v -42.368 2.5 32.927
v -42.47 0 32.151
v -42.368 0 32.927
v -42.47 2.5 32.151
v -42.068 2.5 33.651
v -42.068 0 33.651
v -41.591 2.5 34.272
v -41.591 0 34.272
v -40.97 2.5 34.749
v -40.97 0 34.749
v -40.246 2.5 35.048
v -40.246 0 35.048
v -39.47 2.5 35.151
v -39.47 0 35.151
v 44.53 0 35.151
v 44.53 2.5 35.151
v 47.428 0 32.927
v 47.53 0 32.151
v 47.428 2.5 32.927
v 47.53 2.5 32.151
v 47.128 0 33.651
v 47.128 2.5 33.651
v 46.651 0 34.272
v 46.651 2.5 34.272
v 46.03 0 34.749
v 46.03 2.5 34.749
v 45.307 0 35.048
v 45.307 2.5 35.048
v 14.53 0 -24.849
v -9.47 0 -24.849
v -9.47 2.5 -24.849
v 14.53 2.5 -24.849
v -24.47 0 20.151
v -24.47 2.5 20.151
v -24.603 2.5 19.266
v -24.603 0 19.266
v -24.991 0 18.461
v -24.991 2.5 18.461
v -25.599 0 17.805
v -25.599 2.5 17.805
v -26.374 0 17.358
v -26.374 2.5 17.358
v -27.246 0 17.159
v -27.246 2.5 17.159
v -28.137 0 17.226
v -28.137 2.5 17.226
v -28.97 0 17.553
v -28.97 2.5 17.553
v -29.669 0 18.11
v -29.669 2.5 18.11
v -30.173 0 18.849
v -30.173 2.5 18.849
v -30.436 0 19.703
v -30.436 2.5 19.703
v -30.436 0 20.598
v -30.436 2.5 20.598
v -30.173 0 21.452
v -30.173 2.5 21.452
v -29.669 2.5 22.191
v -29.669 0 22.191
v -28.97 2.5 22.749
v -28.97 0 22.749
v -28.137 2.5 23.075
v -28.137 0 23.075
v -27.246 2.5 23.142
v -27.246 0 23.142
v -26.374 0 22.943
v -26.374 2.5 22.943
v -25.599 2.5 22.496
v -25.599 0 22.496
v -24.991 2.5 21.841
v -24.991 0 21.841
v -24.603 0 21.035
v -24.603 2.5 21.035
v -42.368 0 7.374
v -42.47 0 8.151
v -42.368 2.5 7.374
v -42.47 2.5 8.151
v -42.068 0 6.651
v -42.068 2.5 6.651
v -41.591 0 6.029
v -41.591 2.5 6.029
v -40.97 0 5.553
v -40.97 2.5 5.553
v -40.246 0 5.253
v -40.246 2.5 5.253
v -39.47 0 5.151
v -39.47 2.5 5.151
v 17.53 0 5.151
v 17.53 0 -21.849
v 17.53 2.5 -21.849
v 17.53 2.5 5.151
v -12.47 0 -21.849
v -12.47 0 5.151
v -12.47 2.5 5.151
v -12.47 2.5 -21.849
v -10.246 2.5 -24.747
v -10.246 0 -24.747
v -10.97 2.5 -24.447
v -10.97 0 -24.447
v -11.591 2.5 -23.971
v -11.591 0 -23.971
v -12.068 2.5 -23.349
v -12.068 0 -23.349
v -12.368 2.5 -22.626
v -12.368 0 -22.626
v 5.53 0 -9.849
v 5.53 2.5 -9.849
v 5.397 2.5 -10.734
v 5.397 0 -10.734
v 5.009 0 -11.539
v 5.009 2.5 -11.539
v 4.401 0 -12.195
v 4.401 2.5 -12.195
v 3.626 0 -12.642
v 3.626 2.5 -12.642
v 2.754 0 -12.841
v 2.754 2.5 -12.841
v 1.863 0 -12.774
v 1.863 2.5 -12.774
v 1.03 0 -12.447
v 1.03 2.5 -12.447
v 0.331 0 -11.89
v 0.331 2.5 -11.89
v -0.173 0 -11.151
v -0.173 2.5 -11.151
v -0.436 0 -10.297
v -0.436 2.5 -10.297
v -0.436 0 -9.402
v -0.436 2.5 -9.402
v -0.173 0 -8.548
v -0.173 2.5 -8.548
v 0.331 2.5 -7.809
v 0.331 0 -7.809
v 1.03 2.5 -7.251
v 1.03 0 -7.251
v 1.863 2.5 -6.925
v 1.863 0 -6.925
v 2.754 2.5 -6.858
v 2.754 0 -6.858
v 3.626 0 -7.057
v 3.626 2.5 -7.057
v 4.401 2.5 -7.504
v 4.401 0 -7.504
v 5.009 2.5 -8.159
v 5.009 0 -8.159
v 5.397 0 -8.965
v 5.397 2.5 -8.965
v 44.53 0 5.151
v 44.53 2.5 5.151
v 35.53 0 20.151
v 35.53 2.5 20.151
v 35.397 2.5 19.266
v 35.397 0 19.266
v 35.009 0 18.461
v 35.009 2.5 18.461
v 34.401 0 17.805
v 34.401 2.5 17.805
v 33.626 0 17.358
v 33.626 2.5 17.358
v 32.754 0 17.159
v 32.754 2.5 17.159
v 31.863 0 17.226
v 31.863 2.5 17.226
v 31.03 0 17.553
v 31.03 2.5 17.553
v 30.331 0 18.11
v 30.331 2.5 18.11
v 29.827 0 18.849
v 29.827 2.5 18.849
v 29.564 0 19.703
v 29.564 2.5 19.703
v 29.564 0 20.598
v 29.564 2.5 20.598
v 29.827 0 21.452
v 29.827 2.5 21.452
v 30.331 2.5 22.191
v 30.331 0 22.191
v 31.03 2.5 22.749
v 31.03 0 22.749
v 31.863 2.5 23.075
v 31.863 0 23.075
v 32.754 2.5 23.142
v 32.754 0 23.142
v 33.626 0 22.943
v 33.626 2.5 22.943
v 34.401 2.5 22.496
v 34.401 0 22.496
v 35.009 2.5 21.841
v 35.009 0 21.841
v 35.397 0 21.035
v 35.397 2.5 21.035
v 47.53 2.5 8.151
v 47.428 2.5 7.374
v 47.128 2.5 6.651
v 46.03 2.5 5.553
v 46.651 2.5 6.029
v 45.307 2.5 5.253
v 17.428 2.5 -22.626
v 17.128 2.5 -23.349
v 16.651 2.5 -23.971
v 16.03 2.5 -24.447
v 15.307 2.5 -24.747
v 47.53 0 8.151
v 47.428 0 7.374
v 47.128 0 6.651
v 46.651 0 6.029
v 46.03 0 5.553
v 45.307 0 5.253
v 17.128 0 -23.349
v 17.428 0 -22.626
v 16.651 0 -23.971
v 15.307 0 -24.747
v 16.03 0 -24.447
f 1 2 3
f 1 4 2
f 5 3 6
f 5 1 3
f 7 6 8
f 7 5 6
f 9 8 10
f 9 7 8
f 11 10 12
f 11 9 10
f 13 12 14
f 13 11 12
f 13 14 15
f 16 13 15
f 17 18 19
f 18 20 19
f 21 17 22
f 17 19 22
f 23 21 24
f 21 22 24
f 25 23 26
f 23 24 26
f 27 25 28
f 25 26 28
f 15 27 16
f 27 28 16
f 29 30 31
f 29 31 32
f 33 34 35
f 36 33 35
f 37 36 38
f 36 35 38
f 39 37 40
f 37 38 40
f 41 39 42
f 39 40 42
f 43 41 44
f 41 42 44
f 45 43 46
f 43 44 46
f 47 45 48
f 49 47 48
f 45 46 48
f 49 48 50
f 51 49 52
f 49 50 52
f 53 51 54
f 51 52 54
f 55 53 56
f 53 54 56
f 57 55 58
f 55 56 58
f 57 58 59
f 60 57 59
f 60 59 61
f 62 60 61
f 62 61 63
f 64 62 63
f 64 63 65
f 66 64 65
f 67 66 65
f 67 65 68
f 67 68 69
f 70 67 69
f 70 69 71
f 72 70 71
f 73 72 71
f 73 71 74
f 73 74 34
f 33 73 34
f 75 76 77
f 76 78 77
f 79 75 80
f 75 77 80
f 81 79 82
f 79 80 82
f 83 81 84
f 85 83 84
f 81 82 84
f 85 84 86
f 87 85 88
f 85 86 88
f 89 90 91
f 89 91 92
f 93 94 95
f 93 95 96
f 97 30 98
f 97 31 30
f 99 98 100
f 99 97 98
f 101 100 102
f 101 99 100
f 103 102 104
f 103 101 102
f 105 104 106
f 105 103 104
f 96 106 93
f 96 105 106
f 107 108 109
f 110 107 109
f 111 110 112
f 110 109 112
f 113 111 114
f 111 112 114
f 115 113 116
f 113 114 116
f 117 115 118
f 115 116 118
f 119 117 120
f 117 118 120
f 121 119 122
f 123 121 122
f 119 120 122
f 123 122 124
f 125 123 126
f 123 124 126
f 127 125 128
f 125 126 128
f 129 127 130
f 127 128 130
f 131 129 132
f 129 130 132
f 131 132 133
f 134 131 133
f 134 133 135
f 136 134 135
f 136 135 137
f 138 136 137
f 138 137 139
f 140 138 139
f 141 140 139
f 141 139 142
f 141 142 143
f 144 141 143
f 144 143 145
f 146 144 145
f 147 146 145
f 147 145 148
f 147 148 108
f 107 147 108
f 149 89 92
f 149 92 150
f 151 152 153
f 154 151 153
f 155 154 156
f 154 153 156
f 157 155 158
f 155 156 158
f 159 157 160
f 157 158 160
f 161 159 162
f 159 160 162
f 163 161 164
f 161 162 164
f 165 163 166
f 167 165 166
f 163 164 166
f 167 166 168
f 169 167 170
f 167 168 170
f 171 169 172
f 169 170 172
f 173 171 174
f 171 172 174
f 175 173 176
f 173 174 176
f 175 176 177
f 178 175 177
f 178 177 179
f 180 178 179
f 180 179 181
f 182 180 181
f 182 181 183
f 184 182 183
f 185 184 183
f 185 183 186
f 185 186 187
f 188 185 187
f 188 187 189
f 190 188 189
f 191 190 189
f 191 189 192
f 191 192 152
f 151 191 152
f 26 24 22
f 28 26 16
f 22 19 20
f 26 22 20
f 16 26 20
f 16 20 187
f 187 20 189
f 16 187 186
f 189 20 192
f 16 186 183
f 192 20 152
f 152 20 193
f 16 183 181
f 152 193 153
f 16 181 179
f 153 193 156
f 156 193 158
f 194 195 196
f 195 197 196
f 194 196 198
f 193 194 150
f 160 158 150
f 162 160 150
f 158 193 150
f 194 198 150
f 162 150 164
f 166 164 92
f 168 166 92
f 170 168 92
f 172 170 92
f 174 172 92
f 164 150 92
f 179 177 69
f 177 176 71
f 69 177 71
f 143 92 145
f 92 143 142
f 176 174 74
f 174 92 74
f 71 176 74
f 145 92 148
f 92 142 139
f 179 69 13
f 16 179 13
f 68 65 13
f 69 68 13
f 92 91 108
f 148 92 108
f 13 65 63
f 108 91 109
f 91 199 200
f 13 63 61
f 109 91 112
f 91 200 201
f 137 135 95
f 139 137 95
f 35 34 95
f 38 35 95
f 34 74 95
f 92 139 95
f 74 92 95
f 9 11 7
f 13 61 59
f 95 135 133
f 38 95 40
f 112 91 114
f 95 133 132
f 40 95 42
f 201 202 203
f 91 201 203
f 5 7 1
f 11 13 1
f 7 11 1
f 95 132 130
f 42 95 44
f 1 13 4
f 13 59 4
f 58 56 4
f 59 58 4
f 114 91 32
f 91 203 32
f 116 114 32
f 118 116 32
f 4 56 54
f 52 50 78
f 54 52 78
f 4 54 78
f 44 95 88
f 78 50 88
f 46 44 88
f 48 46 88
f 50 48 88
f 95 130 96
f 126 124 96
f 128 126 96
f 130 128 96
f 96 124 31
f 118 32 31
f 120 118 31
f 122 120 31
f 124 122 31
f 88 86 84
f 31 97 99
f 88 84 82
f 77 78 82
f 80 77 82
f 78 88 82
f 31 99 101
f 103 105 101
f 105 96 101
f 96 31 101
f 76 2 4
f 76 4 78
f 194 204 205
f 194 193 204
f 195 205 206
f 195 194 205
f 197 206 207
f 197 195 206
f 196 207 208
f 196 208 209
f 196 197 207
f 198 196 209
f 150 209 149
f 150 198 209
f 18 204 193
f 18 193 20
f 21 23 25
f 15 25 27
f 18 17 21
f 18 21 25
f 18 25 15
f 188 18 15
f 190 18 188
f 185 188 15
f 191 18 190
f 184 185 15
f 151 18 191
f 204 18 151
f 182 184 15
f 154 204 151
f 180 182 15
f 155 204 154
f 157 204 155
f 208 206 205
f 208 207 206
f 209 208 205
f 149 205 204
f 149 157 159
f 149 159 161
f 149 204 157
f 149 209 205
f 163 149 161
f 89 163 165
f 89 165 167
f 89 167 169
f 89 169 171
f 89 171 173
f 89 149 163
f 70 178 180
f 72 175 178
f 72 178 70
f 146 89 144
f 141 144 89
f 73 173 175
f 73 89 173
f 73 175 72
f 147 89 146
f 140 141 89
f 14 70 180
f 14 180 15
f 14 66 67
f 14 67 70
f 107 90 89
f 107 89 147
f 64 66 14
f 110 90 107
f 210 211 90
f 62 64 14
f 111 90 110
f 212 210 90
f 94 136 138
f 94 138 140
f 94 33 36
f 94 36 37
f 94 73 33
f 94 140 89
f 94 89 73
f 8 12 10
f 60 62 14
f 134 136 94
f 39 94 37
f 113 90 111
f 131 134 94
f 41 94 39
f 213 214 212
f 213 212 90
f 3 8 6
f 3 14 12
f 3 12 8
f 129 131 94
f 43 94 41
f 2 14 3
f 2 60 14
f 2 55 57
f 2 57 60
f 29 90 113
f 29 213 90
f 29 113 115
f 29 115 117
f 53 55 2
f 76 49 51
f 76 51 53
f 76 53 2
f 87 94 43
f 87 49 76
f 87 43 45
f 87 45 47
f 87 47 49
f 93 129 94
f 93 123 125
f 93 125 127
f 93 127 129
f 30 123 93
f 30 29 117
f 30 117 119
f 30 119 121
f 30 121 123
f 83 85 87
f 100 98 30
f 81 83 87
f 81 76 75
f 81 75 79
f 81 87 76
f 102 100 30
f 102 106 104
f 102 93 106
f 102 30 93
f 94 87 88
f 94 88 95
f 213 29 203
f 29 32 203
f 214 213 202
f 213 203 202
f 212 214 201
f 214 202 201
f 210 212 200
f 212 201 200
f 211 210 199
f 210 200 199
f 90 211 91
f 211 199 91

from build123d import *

# Parameters (mm, degrees)
BOSS_EXTRUDE1_DEPTH = 2.5
FILLET1_R           = 3
FILLET2_R           = 3
FILLET4_R           = 3
FILLET5_R           = 3
SKETCH2_R           = 3
CUT_EXTRUDE1_DEPTH  = 3
FILLET6_R           = 3
FILLET7_R           = 3


with BuildPart() as part:
    # Sketch1 → Boss-Extrude1 (new body)
    with BuildSketch(Plane(origin=(0, 0, 0), x_dir=(1, 0, 0), z_dir=(0, 1, 0))):
        Polygon((-12.469879518, 24.84939759), (17.530120482, 24.84939759), (17.530120482, -5.15060241), (47.530120482, -5.15060241), (47.530120482, -35.15060241), (17.530120482, -35.15060241), (-12.469879518, -35.15060241), (-42.469879518, -35.15060241), (-42.469879518, -5.15060241), (-12.469879518, -5.15060241), align=None)
    extrude(amount=BOSS_EXTRUDE1_DEPTH)

    # Fillet1
    fillet1_edges = [part.edges().sort_by_distance(p)[0] for p in [
        (-42.469879518, 1.25, 5.15060241),
    ]]
    fillet(fillet1_edges, radius=FILLET1_R)

    # Fillet2
    fillet2_edges = [part.edges().sort_by_distance(p)[0] for p in [
        (-42.469879518, 1.25, 35.15060241),
    ]]
    fillet(fillet2_edges, radius=FILLET2_R)

    # Fillet4
    fillet4_edges = [part.edges().sort_by_distance(p)[0] for p in [
        (17.530120482, 1.25, -24.84939759),
    ]]
    fillet(fillet4_edges, radius=FILLET4_R)

    # Fillet5
    fillet5_edges = [part.edges().sort_by_distance(p)[0] for p in [
        (-12.469879518, 1.25, -24.84939759),
    ]]
    fillet(fillet5_edges, radius=FILLET5_R)

    # Sketch2 → Cut-Extrude1 (cut)
    with BuildSketch(Plane(origin=(0, 2.5, 0), x_dir=(1, 0, 0), z_dir=(0, 1, 0))):
        with Locations((2.530120482, 9.84939759)):
            Circle(SKETCH2_R)
        with Locations((-27.469879518, -20.15060241)):
            Circle(SKETCH2_R)
        with Locations((32.530120482, -20.15060241)):
            Circle(SKETCH2_R)
    extrude(amount=-CUT_EXTRUDE1_DEPTH, mode=Mode.SUBTRACT)

    # Fillet6
    fillet6_edges = [part.edges().sort_by_distance(p)[0] for p in [
        (47.530120482, 1.25, 35.15060241),
    ]]
    fillet(fillet6_edges, radius=FILLET6_R)

    # Fillet7
    fillet7_edges = [part.edges().sort_by_distance(p)[0] for p in [
        (47.530120482, 1.25, 5.15060241),
    ]]
    fillet(fillet7_edges, radius=FILLET7_R)


solid = part.part
